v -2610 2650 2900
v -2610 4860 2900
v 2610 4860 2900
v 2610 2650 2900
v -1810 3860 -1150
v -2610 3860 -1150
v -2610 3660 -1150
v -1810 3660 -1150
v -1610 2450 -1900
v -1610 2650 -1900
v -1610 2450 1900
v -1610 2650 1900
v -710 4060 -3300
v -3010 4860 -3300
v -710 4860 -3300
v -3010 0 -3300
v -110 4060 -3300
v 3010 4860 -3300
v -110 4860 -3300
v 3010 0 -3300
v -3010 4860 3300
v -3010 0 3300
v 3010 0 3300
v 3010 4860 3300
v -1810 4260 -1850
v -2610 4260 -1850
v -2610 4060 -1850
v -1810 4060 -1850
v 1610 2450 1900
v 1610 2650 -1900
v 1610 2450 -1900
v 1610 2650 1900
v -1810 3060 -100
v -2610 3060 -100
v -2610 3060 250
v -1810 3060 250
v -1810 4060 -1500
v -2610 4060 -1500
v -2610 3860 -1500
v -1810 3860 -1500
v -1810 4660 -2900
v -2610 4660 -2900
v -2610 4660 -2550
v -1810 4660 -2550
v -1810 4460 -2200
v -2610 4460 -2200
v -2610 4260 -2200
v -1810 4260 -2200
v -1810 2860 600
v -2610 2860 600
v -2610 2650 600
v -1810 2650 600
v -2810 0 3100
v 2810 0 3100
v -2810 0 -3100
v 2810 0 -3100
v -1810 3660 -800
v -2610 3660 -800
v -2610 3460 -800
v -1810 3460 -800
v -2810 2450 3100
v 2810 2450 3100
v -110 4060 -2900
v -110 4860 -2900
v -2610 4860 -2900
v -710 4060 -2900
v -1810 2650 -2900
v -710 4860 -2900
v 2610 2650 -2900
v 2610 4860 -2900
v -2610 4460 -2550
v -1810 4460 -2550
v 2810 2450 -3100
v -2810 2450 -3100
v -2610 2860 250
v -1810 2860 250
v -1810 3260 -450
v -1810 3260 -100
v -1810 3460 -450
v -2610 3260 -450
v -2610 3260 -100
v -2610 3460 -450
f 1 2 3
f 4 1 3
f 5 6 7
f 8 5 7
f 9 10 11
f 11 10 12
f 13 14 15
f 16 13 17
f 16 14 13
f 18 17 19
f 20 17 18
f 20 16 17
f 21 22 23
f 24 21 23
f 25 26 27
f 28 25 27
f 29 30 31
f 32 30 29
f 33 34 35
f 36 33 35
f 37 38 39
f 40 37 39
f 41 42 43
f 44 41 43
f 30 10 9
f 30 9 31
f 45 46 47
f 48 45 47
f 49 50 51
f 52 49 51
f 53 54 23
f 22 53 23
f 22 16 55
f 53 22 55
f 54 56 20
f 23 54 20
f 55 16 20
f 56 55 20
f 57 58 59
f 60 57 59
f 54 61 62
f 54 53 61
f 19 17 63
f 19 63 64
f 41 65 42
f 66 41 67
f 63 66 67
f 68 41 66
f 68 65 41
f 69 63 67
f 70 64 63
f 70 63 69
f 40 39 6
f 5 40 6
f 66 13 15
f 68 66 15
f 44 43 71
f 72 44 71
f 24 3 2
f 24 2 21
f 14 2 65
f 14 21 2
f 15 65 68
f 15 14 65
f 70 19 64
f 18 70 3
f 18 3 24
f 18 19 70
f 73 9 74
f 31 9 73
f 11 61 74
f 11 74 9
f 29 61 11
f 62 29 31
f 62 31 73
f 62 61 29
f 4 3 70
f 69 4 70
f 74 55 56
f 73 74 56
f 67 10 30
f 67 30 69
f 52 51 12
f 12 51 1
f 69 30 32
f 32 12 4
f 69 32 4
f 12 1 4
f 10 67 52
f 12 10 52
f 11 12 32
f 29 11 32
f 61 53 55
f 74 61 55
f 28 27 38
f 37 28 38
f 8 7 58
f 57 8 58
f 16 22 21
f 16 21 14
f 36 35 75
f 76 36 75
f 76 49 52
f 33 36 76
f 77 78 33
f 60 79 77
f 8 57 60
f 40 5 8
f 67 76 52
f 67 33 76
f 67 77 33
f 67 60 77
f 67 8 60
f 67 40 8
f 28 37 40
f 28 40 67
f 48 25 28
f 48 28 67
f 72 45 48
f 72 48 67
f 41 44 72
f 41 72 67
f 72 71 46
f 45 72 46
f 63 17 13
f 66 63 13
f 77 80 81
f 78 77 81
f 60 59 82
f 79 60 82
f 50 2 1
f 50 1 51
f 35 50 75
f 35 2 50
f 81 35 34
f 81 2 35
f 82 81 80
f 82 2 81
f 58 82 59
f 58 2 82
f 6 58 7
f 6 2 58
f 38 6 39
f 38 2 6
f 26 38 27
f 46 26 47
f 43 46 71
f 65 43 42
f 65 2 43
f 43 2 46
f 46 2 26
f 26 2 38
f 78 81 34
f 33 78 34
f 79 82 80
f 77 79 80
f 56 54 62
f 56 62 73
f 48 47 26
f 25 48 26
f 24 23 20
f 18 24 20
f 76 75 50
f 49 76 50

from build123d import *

# Parameters (mm, degrees)
CROQUIS1_W              = 6020
CROQUIS1_H              = 6600
CROQUIS1_W_2            = 5620
CROQUIS1_H_2            = 6200
SALIENTE_EXTRUIR1_DEPTH = 4860
CROQUIS2_W              = 6020
CROQUIS2_H              = 6600
SALIENTE_EXTRUIR2_DEPTH = 300
CROQUIS4_W              = 5620
CROQUIS4_H              = 6200
CROQUIS4_W_2            = 5220
CROQUIS4_H_2            = 5800
SALIENTE_EXTRUIR3_DEPTH = 2210
CROQUIS5_W              = 5620
CROQUIS5_H              = 6200
CORTAR_EXTRUIR1_DEPTH   = 300
CROQUIS7_W              = 5620
CROQUIS7_H              = 6200
CROQUIS7_W_2            = 3220
CROQUIS7_H_2            = 3800
SALIENTE_EXTRUIR5_DEPTH = 200
SALIENTE_EXTRUIR6_DEPTH = 800
CROQUIS9_W              = 600
CROQUIS9_H              = 800
CORTAR_EXTRUIR2_DEPTH   = 400


with BuildPart() as part:
    # Croquis1 → Saliente-Extruir1 (new body)
    with BuildSketch(Plane(origin=(0, 0, 0), x_dir=(1, 0, 0), z_dir=(0, 1, 0))):
        Rectangle(CROQUIS1_W, CROQUIS1_H)
        Rectangle(CROQUIS1_W_2, CROQUIS1_H_2, mode=Mode.SUBTRACT)
    extrude(amount=SALIENTE_EXTRUIR1_DEPTH)

    # Croquis2 → Saliente-Extruir2 (add)
    with BuildSketch(Plane.XZ):
        Rectangle(CROQUIS2_W, CROQUIS2_H)
    extrude(amount=-SALIENTE_EXTRUIR2_DEPTH)

    # Croquis4 → Saliente-Extruir3 (add)
    with BuildSketch(Plane(origin=(0, 4860, 0), x_dir=(1, 0, 0), z_dir=(0, 1, 0))):
        Rectangle(CROQUIS4_W, CROQUIS4_H)
        Rectangle(CROQUIS4_W_2, CROQUIS4_H_2, mode=Mode.SUBTRACT)
    extrude(amount=-SALIENTE_EXTRUIR3_DEPTH)

    # Croquis5 → Cortar-Extruir1 (cut)
    with BuildSketch(Plane.XZ):
        Rectangle(CROQUIS5_W, CROQUIS5_H)
    extrude(amount=-CORTAR_EXTRUIR1_DEPTH, mode=Mode.SUBTRACT)

    # Croquis7 → Saliente-Extruir5 (add)
    with BuildSketch(Plane.XZ.offset(-2650)):
        Rectangle(CROQUIS7_W, CROQUIS7_H)
        Rectangle(CROQUIS7_W_2, CROQUIS7_H_2, mode=Mode.SUBTRACT)
    extrude(amount=SALIENTE_EXTRUIR5_DEPTH)

    # Croquis8 → Saliente-Extruir6 (add)
    with BuildSketch(Plane(origin=(-2610, 0, 0), x_dir=(0, 0, -1), z_dir=(1, 0, 0))):
        Polygon((2900, 4660), (2550, 4660), (2550, 4460), (2200, 4460), (2200, 4260), (1850, 4260), (1850, 4060), (1500, 4060), (1500, 3860), (1150, 3860), (1150, 3660), (800, 3660), (800, 3460), (450, 3460), (450, 3260), (100, 3260), (100, 3060), (-250, 3060), (-250, 2860), (-600, 2860), (-600, 2649.927866399), (2900, 2650), align=None)
    extrude(amount=SALIENTE_EXTRUIR6_DEPTH)

    # Croquis9 → Cortar-Extruir2 (cut)
    with BuildSketch(Plane(origin=(0, 0, -3300), x_dir=(-1, 0, 0), z_dir=(0, 0, -1))):
        with Locations((410, 4460)):
            Rectangle(CROQUIS9_W, CROQUIS9_H)
    extrude(amount=-CORTAR_EXTRUIR2_DEPTH, mode=Mode.SUBTRACT)


solid = part.part
